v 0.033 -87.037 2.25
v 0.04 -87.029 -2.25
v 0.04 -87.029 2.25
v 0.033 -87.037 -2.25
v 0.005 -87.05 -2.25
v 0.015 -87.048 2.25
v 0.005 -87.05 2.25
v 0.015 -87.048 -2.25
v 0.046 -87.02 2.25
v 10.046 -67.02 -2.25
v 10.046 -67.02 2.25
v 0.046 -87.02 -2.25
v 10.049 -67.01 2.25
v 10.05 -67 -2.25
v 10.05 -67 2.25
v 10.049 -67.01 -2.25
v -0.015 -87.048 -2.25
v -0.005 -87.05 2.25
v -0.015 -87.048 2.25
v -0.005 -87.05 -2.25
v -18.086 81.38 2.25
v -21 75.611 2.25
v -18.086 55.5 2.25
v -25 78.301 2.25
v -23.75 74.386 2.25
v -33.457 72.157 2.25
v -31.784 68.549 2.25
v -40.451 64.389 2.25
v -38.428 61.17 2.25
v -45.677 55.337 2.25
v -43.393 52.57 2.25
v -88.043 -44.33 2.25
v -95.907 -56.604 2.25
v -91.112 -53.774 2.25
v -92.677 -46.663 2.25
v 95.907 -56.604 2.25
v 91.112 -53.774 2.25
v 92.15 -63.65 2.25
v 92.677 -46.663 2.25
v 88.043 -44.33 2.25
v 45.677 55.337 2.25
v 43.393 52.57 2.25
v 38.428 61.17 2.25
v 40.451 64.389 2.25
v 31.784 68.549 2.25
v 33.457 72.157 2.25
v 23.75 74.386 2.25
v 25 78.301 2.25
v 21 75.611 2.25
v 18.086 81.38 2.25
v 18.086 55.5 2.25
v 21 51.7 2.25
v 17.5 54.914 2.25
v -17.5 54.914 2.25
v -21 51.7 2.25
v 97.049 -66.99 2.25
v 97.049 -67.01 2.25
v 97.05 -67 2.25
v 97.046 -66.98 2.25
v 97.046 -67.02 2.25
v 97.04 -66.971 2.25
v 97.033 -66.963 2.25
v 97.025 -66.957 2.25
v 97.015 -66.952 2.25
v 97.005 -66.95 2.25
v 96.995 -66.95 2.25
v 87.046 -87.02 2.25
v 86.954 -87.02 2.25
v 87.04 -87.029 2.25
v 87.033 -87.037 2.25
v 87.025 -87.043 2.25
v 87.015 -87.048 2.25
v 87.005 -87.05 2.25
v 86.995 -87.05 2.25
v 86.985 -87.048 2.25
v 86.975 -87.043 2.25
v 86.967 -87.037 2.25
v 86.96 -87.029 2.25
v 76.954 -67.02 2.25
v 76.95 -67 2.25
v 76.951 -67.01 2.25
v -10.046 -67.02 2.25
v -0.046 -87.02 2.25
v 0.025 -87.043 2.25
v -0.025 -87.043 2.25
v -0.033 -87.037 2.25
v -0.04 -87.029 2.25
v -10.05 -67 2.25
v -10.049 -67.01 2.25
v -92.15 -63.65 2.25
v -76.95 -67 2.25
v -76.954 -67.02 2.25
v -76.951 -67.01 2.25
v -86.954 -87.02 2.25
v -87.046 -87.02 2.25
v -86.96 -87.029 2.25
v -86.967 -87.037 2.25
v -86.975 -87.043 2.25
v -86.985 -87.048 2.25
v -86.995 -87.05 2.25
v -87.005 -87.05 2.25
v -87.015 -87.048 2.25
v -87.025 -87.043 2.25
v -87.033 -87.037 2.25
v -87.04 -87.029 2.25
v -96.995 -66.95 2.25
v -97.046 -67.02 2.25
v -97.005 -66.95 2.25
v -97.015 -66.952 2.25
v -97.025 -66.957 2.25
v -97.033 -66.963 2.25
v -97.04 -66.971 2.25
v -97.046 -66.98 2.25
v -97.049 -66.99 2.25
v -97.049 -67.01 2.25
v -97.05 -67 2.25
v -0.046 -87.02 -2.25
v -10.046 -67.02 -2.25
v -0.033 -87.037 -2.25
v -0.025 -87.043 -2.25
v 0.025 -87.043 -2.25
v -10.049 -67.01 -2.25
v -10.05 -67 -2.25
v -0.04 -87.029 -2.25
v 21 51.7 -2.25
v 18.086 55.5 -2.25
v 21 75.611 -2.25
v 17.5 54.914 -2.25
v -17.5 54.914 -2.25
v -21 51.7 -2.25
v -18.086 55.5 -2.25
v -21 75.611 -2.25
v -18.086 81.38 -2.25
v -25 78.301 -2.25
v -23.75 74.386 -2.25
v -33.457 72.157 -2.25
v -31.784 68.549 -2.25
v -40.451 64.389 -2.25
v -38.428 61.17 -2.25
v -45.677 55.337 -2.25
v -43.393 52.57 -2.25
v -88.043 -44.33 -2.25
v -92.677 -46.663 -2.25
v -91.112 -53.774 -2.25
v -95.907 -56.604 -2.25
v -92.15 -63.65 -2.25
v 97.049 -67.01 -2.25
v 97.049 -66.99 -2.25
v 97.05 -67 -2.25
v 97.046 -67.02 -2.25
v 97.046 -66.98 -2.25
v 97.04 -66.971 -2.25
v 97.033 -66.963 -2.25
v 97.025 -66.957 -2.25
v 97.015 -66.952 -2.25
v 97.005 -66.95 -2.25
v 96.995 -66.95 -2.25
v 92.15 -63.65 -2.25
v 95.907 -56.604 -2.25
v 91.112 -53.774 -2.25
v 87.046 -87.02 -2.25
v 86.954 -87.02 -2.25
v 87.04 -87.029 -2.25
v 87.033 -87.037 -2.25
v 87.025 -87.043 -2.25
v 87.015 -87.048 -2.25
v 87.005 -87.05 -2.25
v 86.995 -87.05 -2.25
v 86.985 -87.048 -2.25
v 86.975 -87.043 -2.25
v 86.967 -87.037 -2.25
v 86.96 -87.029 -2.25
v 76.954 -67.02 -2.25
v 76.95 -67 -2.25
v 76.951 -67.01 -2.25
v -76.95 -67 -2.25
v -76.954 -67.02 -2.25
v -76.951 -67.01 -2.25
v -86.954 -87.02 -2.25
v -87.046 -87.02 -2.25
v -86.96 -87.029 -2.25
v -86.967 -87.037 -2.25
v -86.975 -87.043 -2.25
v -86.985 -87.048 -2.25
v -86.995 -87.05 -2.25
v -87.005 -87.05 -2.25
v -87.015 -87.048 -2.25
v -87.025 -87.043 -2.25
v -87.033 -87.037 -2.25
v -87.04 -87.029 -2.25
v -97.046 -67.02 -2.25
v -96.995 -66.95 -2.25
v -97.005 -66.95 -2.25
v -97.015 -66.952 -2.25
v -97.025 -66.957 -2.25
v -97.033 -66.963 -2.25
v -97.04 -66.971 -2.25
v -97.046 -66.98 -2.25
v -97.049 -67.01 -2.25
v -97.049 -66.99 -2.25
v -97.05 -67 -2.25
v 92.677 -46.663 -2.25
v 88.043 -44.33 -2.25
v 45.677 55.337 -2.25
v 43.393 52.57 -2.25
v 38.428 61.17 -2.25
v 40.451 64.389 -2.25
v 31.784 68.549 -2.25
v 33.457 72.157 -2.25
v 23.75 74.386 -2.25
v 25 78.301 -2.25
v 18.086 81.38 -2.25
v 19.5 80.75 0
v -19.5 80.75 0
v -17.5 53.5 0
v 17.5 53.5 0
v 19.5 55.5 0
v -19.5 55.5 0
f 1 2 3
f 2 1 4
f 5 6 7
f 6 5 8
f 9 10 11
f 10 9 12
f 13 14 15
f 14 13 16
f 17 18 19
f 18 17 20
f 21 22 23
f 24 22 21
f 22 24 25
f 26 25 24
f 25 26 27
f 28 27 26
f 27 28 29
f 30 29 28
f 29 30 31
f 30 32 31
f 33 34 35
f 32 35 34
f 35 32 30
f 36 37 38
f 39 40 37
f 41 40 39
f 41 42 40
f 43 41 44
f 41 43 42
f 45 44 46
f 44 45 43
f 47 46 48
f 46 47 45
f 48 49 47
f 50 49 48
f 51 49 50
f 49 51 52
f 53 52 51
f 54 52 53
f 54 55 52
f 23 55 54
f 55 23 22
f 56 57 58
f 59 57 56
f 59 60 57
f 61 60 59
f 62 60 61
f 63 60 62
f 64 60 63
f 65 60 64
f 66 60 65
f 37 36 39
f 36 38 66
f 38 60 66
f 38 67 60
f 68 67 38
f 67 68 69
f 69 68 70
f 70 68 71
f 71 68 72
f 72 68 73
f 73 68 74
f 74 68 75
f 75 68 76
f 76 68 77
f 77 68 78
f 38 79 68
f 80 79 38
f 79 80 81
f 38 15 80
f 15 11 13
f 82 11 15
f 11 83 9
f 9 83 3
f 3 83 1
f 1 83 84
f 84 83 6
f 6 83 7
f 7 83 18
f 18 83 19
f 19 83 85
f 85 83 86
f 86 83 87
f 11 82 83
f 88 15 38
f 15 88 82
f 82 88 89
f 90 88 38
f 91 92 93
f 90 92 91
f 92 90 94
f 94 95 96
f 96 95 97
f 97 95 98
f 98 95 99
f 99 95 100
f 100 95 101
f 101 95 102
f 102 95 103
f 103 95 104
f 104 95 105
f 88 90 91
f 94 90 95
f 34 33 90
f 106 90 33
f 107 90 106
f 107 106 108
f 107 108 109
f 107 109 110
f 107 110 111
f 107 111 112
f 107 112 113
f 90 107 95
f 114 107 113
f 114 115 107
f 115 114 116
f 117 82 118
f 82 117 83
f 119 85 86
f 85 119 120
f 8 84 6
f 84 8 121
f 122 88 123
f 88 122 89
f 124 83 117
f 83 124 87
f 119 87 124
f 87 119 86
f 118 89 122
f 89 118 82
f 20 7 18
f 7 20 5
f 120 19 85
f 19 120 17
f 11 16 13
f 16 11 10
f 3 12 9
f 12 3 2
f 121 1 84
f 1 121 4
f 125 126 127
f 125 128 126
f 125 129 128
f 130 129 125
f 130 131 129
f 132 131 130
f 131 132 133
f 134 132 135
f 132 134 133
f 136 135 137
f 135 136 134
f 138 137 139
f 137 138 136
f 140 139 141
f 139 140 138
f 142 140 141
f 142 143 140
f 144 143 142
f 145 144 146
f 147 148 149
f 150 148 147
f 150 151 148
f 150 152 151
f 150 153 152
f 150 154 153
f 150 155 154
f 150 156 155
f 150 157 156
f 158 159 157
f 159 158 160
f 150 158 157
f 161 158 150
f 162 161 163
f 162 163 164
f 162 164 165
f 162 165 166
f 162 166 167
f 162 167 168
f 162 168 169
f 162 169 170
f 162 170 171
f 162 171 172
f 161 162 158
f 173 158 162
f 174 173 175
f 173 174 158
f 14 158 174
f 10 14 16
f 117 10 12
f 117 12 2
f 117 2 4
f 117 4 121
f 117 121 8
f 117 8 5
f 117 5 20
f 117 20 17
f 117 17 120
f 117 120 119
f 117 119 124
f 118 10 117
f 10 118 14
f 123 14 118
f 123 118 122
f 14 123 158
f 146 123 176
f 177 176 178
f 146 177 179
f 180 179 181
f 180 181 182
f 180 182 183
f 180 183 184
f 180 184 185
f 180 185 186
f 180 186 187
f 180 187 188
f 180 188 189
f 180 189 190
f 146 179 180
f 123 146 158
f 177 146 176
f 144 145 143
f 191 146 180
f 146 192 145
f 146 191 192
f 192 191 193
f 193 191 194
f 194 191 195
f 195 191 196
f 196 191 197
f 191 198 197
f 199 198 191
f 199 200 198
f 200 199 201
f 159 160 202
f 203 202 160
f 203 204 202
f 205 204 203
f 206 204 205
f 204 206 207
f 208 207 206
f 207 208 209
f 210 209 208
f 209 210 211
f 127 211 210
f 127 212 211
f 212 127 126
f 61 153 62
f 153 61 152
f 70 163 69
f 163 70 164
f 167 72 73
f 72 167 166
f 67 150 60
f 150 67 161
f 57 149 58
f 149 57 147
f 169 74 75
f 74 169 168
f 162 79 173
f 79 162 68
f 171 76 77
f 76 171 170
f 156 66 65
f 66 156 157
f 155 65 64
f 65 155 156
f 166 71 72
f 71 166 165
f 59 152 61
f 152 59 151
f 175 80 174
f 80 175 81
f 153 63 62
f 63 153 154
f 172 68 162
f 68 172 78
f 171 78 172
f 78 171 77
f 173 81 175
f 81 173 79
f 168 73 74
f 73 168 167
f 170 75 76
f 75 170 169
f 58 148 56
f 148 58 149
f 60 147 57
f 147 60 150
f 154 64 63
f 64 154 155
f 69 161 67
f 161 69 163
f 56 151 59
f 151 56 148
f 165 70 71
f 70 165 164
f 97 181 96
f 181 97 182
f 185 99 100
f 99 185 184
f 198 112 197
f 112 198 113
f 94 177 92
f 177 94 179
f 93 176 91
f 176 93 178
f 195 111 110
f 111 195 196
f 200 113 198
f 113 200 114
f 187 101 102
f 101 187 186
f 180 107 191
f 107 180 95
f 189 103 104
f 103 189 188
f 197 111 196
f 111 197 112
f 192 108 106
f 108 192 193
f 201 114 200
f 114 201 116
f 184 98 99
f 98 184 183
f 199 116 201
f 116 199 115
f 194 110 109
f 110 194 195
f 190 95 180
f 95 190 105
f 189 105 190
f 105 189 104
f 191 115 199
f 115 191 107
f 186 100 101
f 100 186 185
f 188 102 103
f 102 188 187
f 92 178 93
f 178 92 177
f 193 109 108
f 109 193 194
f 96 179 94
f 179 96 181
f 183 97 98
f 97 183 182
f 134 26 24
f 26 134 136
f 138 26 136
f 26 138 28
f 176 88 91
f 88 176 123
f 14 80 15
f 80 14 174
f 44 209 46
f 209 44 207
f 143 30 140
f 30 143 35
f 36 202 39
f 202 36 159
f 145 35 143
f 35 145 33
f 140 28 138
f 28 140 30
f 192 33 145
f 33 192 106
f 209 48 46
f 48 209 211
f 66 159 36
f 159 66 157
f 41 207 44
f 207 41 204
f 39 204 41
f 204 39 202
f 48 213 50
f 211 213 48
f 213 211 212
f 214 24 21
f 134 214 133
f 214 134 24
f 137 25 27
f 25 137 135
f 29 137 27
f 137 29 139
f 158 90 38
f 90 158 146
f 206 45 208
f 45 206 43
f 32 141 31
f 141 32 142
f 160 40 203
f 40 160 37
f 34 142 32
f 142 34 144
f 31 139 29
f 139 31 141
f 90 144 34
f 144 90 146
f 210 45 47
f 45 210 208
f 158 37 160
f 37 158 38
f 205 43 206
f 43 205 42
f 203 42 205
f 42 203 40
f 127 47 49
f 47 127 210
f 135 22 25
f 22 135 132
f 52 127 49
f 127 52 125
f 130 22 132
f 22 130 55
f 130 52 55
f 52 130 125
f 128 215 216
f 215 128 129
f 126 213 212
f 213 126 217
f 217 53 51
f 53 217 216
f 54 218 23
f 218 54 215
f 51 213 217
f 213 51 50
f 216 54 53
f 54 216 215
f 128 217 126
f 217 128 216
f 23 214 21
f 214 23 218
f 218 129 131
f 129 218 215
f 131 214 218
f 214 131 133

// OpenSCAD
// file: rollerSideMount.scad
use<../../../scadLib/honeycomb_mesh.scad>;
include<shared.scad>;


//rollerSideMountBaseCutOut();

rollerSideMountMesh();

/////////////////////////////////////////////
module rollerSideMountMesh(){
  difference(){
    rollerSideMountBase();
    translate([0,-.5,0])
      scale([0.95,0.9,1.2])
      rollerSideMountBaseNoangle();
  }
  //  Mesh
  intersection(){
  translate([0,0,-side_hc_offset/2])
    hexagonal_grid([sideTopCutoutX+10, sideTopCutoutY+10, side_hc_height], side_hc_diameter, side_hc_thickness);
    rollerSideMountBaseNoangle();
  }
}
/////////////////////////////////////////////
module rollerSideMountBase(){
  intersection(){
    rollerSideMountEdges();
    translate([0,-40])
      cylinder(d=100,h=gZ,center=true);
  }
}
/////////////////////////////////////////////
module rollerSideMountBaseNoangle(){
  intersection(){
    cube([sideTopCutoutX,sideTopCutoutY,gZ],center=true);
    translate([0,-40])
      cylinder(d=100,h=gZ,center=true);
  }
}
/////////////////////////////////////////////
module rollerSideMountBaseCutOut(){
  rollerSideMountEdges();
}
/////////////////////////////////////////////
module rollerSideMountEdges(){
  hull(){
    // sides
    translate([sideTopCutoutX/2,0,0])
      rollerSideountEdge();
    translate([-sideTopCutoutX/2,0,0])
      rollerSideountEdge();
    // bottom
    translate([0,-(sideTopCutoutX/2)+3,0])
      resize([sideTopCutoutY+5,0,0])
      rotate([0,0,90])
      rollerSideountEdge();
  }
}
/////////////////////////////////////////////
module rollerSideountEdge(){
  resize([4,0,0]) 
    rotate([0,45,0])
    cube([gZ,sideTopCutoutY-1,gZ],center=true);
}
// file: shared.scad
$fn=30; 

sideLegth=70; // 80
sideWidth=200;
gZ=4.5;

sideTopCutoutX=35;
sideTopCutoutY=30;

side_hc_offset=1;

side_hc_width=sideWidth+10;
side_hc_length=sideWidth+10;
side_hc_height=gZ-side_hc_offset;
side_hc_diameter=5;
side_hc_thickness=1;
// file: ../../../scadLib/honeycomb_mesh.scad
//---------------------------------------------------------------
//-- Openscad Honeycomb mesh used in Cool PCB Enclosure (http://www.thingiverse.com/thing:1665075).
//-- This is a simple honeycomb, reusing ideas and code from the following excellent projects:
//--   + "Customizable Fan Grille" (http://www.thingiverse.com/thing:52305).
//--   + "Radiator difussers" (http://www.thingiverse.com/thing:Resolution07)
//-- IMPORTANT NOTES:
//--   + The coordinate system is mostly center based in order to simplify the integration between different projects involved.
//-- Version: 1.0
//-- Jul-2016
//---------------------------------------------------------------
//-- Released under the GPL3 license
//---------------------------------------------------------------

//---------------------------------------------------------------
//-- CUSTOMIZER PARAMETERS
//---------------------------------------------------------------

// - honeycomb length
hc_length = 224;
// - honeycomb width
hc_width = 182;
// - honeycomb height
hc_height = 3;
// - hexagon hole diameter
hexagon_diameter = 20;
// - hexagon frame thickness
hexagon_thickness = 2;


/* [HIDDEN] */

box = [hc_width, hc_length, hc_height];



//---------------------------------------------------------------
//-- MODULES
//---------------------------------------------------------------



// * HONEYCOMB

module hexagonal_grid(box, hexagon_diameter, hexagon_thickness){
// first arg is vector that defines the bounding box, length, width, height
// second arg in the 'diameter' of the holes. In OpenScad, this refers to the corner-to-corner diameter, not flat-to-flat
// this diameter is 2/sqrt(3) times larger than flat to flat
// third arg is wall thickness.  This also is measured that the corners, not the flats. 

// example 
//    hexagonal_grid([25, 25, 5], 5, 1);

    difference(){
        cube(box, center = true);
        hexgrid(box, hexagon_diameter, hexagon_thickness);
    }
}


module hex_hole(hexdiameter, height){
        translate([0, 0, 0]) rotate([0, 0, 0]) cylinder(d = hexdiameter, h = height + 1, center = true, $fn = 6);
}


module hexgrid(box, hexagon_diameter, hexagon_thickness) {
    cos60 = cos(60);
    sin60 = sin(60);
    d = hexagon_diameter + hexagon_thickness;
    a = d*sin60;

    moduloX = (box[0] % (2*a*sin60));
//    numX = (box[0] - moduloX) / a;
    numX =  floor(box[0] / (2*a*sin60));
    oddX = numX % 2;
    numberX = numX;

    moduloY = (box[1] % a);
//    numY = (box[1] - moduloY) / a;
    numY =  floor(box[1]/a);
    oddY = numY % 2;
    numberY = numY;

// Center the central hexagon on the origin of coordinates
    deltaY = oddY == 1 ? a/2 : 0;

    x0 = (numberX + 2) * 2*a*sin60;
    y0 = (numberY + 2) * a/2 + deltaY;

    for(x = [ -x0: 2*a*sin60 : x0]) {
        for(y = [ -y0 : a : y0]) {
            translate([x, y, 0]) hex_hole(hexdiameter = hexagon_diameter, height = box[2] + 0.001);
           translate([x + a*sin60, y + a*cos60 , 0]) hex_hole(hexdiameter = hexagon_diameter, height = box[2] + 0.001);
// echo ([x, y]);
// echo ([x + a*sin60, y + a*cos60]);
            
         } //fo
    } //fo
} //mo

// * END OF HONEYCOMB



//---------------------------------------------------------------
//-- RENDERS
//---------------------------------------------------------------


    hexagonal_grid(box, hexagon_diameter, hexagon_thickness);
//    hexagonal_grid([25, 25, 5], 5, 1);
// main file
//translate([-6,0,-5])
//import("Rubbermaid_21_cup_spool_stand/files/Spool_Side_Blank.stl");

use<../../../scadLib/honeycomb_mesh.scad>;
include<shared.scad>;

use<rollerSideMount.scad>;

  
translate([0,-77,0])
	pointsBase();

difference(){
translate([0,0,0])
	side();
	difference(){
		scale([0.95,0.95,1.2])
			side();
		translate([0,sideLegth,0])
		scale([1.2,1.22,1.2])
			cube([sideTopCutoutX,sideTopCutoutY,gZ+2],center=true);
	}
  translate([0,sideLegth,0])
    rollerSideMountBaseCutOut();
}
//  translate([0,sideLegth,10])
//    rollerSideMountBase();

//  Mesh
//intersection(){
//translate([0,0,-side_hc_offset/2])
//	hexagonal_grid([side_hc_width, side_hc_length, side_hc_height], side_hc_diameter, side_hc_thickness);
//	side();
//}
/////////////////////////////////////////////
module side(){
	difference(){
		hull(){
			translate([0,sideLegth/2,0])
				top();
		
	// Bottom side curves
			translate([-47,-67,0])
				botSideCurve();
			translate([47,-67,0])
				botSideCurve();
		}
		translate([0,sideLegth,0])
			cube([sideTopCutoutX,sideTopCutoutY,gZ+2],center=true);
	}
}
/////////////////////////////////////////////
module top(){
	cylinder(d=100,h=gZ,center=true);
//	rotate([0,0,30])
//	cube([10,50,gZ+2],center=true);
}
/////////////////////////////////////////////
module botSideCurve(){
	difference(){
		cylinder(d=100,h=gZ,center=true);
		translate([0,-100/2,0])
			cube([101,100,gZ+2],center=true);
	}
}
/////////////////////////////////////////////
module pointsBase(){
	
	seperation = 87;
			
	pointBase();
	translate([seperation,0,0])
		pointBase();
	translate([-seperation,0,0])
		pointBase();

}
/////////////////////////////////////////////
module pointBase(){
	hull(){
		translate([0,-10,0])
		cylinder(d=.1,h=gZ,center=true);

		translate([10,10,0])
			cylinder(d=.1,h=gZ,center=true);

		translate([-10,10,0])
			cylinder(d=.1,h=gZ,center=true);
	}
}
